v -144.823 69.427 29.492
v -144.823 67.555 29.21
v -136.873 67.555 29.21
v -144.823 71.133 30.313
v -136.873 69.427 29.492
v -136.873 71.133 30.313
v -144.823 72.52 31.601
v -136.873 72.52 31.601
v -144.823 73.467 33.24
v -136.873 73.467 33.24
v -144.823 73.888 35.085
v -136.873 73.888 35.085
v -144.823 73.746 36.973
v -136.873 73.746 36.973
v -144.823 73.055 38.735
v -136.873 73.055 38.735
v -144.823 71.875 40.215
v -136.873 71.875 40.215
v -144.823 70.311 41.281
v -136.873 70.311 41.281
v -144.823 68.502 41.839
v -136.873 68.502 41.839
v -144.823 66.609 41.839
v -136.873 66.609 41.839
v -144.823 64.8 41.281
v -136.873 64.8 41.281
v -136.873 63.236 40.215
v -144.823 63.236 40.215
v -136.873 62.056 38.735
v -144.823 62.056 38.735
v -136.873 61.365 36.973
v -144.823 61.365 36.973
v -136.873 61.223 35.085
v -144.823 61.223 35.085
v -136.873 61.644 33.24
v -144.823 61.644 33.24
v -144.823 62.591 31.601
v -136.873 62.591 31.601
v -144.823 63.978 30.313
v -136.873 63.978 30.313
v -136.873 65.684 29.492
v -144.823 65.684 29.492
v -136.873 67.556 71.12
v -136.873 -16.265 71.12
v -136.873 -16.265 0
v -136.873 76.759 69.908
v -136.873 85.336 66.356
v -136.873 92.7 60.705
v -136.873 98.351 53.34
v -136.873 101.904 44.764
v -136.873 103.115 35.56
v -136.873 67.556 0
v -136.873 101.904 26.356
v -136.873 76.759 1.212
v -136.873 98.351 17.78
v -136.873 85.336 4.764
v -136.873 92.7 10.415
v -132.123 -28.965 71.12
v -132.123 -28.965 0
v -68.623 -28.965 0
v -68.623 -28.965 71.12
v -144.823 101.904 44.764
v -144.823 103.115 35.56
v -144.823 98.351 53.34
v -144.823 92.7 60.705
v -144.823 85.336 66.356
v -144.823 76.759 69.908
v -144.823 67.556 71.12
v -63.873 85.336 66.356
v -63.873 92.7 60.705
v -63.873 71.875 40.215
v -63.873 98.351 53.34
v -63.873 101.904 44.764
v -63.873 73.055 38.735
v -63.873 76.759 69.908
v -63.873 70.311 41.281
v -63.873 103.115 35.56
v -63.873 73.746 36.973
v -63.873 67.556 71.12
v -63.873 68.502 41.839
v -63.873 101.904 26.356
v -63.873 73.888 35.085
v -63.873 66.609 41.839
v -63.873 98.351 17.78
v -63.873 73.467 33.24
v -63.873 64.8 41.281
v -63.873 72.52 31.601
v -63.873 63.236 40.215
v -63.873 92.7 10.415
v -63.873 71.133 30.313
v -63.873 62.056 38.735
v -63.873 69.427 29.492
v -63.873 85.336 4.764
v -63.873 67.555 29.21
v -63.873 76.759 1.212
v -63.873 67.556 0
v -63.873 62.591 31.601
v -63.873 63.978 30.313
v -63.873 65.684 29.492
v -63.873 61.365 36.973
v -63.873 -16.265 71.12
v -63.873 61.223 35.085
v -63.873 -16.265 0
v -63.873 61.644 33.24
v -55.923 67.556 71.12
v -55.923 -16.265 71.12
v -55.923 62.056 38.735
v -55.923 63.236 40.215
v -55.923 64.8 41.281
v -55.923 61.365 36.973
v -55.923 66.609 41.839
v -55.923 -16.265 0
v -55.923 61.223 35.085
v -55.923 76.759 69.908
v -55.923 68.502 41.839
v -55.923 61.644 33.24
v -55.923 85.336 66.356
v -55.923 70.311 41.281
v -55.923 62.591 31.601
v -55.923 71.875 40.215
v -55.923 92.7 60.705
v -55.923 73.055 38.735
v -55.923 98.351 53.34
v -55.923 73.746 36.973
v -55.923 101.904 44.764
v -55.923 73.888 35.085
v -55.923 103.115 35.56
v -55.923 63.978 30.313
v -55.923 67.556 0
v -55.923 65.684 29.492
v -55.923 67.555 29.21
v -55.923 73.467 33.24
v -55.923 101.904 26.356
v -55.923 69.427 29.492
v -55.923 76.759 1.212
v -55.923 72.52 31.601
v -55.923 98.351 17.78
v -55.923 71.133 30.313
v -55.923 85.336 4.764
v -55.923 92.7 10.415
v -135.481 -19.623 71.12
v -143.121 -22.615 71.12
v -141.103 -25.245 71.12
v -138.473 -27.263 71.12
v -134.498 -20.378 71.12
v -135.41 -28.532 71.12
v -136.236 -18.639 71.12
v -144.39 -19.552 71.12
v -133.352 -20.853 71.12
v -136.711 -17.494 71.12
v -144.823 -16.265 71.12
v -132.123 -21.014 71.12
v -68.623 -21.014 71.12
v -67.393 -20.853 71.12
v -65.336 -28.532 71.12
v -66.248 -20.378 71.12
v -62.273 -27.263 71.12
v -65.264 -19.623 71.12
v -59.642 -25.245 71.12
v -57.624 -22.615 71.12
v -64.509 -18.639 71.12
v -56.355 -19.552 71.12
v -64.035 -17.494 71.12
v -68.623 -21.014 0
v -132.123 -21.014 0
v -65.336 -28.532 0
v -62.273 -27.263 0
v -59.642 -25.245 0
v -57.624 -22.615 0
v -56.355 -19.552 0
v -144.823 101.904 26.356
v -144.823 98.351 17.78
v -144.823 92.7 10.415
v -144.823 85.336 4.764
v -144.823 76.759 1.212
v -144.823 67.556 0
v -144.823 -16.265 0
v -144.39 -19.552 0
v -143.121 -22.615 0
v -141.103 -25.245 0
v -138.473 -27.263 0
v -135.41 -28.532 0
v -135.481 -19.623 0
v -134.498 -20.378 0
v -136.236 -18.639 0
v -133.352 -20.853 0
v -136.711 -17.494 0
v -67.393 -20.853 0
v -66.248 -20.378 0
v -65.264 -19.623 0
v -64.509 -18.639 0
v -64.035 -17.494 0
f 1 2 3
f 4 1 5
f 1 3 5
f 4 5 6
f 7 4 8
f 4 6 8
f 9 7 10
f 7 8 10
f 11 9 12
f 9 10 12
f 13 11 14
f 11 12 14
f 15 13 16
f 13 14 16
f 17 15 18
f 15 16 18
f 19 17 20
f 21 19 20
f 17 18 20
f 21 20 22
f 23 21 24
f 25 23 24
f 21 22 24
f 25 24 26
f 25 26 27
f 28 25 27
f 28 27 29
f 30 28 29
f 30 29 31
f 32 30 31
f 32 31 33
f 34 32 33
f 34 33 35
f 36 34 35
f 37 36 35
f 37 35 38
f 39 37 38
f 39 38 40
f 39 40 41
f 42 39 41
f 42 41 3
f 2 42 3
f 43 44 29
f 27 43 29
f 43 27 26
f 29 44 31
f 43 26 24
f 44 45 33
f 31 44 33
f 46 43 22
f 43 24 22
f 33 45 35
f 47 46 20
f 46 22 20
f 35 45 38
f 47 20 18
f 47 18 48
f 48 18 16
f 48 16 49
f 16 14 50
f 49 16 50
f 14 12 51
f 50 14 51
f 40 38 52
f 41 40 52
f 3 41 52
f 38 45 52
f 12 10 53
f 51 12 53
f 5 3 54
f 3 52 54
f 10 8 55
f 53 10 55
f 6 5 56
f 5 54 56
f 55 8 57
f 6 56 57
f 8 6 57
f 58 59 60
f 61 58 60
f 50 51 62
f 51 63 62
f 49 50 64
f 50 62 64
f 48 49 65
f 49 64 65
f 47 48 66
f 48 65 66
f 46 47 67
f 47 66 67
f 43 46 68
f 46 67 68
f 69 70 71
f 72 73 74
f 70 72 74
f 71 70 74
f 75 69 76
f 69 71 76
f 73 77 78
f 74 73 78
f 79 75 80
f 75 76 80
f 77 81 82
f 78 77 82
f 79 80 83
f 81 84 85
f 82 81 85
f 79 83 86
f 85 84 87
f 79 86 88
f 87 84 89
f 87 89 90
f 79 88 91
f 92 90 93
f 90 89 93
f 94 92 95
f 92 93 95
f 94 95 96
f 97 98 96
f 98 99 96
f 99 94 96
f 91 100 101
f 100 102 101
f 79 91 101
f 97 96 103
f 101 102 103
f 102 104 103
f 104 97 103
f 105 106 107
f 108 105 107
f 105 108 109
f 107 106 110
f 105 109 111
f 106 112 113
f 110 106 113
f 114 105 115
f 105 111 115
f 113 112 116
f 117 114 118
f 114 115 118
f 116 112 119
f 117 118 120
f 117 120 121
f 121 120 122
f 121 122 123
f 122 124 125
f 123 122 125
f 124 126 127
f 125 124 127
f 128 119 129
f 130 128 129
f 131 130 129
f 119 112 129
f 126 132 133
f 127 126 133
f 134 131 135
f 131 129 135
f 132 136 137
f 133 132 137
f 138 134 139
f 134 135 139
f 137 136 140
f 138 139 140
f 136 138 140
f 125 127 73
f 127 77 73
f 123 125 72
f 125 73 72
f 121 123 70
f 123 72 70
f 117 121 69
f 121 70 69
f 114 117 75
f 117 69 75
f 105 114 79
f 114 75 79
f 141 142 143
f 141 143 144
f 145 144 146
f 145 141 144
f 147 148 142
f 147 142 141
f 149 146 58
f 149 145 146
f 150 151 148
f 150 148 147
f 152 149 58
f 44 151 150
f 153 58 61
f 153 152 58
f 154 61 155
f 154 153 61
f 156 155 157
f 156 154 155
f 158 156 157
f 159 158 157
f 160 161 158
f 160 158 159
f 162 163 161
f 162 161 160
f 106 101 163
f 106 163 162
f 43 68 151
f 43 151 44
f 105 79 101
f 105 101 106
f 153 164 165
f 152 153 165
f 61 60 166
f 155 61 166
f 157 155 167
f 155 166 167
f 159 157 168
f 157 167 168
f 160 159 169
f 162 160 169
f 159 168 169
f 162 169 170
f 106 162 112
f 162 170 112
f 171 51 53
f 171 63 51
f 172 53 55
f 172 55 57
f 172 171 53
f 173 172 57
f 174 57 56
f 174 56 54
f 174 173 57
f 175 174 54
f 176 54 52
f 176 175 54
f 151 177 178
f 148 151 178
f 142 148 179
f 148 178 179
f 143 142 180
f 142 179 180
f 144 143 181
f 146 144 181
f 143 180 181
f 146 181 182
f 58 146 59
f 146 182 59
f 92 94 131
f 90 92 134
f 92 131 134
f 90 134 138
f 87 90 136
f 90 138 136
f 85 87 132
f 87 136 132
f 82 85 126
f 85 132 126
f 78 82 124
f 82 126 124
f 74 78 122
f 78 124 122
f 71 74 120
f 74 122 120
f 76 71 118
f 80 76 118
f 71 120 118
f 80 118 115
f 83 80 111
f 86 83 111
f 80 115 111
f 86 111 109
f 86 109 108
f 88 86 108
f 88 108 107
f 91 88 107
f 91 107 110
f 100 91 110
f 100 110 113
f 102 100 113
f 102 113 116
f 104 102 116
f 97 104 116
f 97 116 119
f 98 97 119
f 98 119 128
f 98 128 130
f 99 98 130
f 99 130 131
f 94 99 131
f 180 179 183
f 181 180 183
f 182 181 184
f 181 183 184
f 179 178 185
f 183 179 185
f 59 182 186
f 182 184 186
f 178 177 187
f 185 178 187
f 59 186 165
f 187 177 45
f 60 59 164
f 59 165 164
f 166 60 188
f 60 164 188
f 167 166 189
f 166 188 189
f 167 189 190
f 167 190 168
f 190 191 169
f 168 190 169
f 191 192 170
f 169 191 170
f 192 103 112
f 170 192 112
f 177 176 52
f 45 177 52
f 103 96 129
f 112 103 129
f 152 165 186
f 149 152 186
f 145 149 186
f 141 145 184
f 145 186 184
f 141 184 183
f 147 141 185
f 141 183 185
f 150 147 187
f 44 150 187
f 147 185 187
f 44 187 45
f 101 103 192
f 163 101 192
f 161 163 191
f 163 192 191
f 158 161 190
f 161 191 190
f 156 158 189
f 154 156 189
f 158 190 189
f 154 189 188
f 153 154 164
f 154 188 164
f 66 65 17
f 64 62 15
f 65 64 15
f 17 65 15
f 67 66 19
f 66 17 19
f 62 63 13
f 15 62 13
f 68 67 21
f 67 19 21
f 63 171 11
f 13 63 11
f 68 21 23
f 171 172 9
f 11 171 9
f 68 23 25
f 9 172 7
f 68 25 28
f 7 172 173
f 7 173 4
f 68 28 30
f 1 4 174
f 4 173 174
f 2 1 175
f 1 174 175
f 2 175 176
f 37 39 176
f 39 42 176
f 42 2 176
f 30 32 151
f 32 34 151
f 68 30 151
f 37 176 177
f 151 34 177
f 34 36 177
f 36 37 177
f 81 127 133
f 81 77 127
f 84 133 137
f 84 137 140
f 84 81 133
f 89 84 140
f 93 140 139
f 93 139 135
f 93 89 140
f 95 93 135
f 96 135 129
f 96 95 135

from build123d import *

# Parameters (mm, degrees)
BOSS_EXTRUDE3_DEPTH = 71.12
FILLET3_R           = 35.56
SKETCH6_R           = 6.35
CUT_EXTRUDE1_DEPTH  = 154.603584906


with BuildPart() as part:
    # Sketch1 → Boss-Extrude3 (new body)
    with BuildSketch(Plane.XY):
        with BuildLine():
            Line((-144.822728972, 103.115454206), (-144.822728972, -16.264545794))
            ThreePointArc((-144.822728972, -16.264545794), (-141.102985093, -25.244801915), (-132.122728972, -28.964545794))
            Line((-132.122728972, -28.964545794), (-68.622728972, -28.964545794))
            ThreePointArc((-68.622728972, -28.964545794), (-59.642472851, -25.244801915), (-55.922728972, -16.264545794))
            Line((-55.922728972, -16.264545794), (-55.922728972, 103.115454206))
            Line((-55.922728972, 103.115454206), (-63.872928972, 103.115454206))
            Line((-63.872928972, 103.115454206), (-63.872928972, -16.264545794))
            ThreePointArc((-63.872928972, -16.264545794), (-65.264113183, -19.623161584), (-68.622728972, -21.014345794))
            Line((-68.622728972, -21.014345794), (-132.122728972, -21.014345794))
            ThreePointArc((-132.122728972, -21.014345794), (-135.481344761, -19.623161584), (-136.872528972, -16.264545794))
            Line((-136.872528972, -16.264545794), (-136.872528972, 103.115454206))
            Line((-136.872528972, 103.115454206), (-144.822728972, 103.115454206))
        make_face()
    extrude(amount=BOSS_EXTRUDE3_DEPTH)

    # Fillet3
    fillet3_edges = [part.edges().sort_by_distance(p)[0] for p in [
        (-59.897828972, 103.115454206, 71.12),
        (-59.897828972, 103.115454206, 0),
        (-140.847628972, 103.115454206, 0),
        (-140.847628972, 103.115454206, 71.12),
    ]]
    fillet(fillet3_edges, radius=FILLET3_R - 0.0001)  # a hair under: the kernel refuses the full size

    # Sketch6 → Cut-Extrude1 (cut, through all)
    with BuildSketch(Plane(origin=(-55.922728972, 0, 0), x_dir=(0, 0, -1), z_dir=(1, 0, 0))):
        with Locations((-35.56, 67.555454206)):
            Circle(SKETCH6_R)
    extrude(amount=-CUT_EXTRUDE1_DEPTH, mode=Mode.SUBTRACT)


solid = part.part
